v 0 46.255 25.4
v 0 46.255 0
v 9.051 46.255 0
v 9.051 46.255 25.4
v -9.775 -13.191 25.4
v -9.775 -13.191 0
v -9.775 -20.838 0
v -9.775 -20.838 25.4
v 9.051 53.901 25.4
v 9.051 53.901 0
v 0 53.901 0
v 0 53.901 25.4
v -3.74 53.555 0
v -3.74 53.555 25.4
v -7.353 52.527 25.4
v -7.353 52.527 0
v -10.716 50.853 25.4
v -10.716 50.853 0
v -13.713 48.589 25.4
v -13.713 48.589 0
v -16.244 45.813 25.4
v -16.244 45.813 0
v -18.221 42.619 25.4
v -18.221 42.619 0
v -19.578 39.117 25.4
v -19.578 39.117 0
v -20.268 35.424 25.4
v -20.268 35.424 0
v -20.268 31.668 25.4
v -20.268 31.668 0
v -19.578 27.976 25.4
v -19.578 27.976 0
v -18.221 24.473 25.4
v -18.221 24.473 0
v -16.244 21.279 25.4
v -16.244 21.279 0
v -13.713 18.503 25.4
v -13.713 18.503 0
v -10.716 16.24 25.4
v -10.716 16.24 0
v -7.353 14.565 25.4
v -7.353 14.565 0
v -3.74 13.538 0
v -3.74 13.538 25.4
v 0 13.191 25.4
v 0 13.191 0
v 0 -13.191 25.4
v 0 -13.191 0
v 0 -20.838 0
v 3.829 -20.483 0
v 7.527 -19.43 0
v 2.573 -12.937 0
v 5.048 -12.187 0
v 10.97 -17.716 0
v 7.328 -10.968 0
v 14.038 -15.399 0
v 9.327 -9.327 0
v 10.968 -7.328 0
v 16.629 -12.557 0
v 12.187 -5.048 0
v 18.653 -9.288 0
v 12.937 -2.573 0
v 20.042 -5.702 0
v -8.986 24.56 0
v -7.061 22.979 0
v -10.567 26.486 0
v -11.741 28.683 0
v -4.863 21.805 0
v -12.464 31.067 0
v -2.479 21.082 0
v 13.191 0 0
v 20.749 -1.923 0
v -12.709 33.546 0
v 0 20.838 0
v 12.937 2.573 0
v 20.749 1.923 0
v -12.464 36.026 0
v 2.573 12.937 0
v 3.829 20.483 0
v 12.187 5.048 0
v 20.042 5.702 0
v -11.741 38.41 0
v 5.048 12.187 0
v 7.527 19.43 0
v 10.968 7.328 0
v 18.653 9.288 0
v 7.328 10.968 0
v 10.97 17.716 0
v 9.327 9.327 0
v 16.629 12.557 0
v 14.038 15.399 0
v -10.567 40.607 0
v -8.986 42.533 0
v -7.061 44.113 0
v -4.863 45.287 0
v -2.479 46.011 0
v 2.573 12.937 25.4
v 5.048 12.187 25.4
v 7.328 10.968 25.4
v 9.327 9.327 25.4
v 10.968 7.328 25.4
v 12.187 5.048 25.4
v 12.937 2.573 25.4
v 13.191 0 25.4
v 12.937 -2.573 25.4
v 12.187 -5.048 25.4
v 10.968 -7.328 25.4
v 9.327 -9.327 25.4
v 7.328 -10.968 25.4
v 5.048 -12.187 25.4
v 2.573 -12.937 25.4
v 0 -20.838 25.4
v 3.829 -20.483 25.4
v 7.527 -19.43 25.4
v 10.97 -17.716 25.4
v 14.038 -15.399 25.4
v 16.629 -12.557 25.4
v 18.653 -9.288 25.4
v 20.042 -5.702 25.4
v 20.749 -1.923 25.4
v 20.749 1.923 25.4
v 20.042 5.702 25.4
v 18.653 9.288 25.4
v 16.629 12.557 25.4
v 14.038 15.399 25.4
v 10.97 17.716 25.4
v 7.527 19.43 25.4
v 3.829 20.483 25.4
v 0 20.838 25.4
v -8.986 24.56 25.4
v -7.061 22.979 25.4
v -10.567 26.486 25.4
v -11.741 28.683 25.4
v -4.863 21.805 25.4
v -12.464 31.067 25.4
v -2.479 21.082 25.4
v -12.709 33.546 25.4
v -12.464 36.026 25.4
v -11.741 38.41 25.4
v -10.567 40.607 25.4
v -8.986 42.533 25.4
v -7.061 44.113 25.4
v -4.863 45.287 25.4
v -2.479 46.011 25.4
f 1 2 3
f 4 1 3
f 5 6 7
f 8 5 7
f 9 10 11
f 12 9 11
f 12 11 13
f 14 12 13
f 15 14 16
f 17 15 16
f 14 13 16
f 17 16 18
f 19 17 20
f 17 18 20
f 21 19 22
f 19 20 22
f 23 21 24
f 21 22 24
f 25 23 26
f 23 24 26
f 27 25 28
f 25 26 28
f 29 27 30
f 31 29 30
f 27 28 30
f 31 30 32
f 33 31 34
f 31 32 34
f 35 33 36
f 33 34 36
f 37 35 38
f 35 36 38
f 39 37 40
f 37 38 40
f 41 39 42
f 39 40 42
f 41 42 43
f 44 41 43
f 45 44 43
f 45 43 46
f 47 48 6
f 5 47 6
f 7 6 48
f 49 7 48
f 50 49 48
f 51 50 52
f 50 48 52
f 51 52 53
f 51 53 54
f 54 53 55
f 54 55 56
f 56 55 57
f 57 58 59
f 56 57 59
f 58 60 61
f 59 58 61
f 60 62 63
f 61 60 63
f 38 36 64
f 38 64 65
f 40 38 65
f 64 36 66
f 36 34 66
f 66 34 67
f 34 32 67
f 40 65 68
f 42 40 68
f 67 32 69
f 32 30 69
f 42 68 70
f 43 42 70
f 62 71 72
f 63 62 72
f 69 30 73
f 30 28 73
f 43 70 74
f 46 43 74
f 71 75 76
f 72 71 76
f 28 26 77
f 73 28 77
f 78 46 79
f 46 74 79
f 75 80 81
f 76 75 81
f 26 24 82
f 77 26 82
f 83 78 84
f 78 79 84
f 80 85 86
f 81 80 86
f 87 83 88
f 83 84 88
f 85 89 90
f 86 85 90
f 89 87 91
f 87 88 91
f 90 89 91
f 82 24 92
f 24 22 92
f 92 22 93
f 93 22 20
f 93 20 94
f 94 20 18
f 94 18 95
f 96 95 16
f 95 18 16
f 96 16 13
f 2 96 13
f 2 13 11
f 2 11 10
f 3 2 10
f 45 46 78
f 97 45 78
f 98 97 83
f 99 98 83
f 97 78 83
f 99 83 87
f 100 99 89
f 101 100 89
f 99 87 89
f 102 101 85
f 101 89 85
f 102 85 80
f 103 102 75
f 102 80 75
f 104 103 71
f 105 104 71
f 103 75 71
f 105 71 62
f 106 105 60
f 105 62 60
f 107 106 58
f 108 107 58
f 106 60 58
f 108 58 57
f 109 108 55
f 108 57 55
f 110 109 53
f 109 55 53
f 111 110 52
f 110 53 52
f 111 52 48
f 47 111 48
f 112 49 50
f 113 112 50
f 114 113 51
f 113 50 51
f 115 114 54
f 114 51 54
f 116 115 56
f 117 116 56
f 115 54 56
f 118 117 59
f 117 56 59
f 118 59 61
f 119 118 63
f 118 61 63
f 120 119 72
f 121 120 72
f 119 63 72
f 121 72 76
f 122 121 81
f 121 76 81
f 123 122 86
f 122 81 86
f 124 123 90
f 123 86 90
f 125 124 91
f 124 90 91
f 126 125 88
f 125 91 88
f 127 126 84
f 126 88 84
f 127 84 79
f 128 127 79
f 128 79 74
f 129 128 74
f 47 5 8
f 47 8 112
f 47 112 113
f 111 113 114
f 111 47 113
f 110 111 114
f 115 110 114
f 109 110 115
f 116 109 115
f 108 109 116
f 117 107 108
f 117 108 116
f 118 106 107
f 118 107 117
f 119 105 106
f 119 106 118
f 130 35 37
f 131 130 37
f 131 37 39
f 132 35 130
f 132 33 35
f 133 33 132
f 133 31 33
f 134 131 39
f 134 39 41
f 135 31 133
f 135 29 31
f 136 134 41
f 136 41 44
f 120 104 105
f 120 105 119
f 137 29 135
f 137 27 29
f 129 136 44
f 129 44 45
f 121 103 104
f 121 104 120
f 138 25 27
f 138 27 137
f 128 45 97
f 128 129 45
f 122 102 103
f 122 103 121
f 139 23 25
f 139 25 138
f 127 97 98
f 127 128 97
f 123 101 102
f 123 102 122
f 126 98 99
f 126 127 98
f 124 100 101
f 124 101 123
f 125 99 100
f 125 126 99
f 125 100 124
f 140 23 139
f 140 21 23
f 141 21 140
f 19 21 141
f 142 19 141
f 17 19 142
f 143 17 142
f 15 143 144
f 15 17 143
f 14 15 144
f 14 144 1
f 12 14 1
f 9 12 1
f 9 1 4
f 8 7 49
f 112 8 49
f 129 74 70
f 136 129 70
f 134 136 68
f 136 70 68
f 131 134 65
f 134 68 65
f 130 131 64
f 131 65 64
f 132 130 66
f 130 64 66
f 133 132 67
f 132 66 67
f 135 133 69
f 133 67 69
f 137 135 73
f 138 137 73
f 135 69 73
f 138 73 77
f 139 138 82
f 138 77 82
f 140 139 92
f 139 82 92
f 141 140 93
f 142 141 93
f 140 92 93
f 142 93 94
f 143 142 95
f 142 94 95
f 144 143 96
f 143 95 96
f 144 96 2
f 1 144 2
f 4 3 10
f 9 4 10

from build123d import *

# Parameters (mm, degrees)
F1_DEPTH = 25.4


with BuildPart() as f1:
    # F0 (on Top) → F1 (new body)
    with BuildSketch(Plane.XY):
        with BuildLine():
            ThreePointArc((0, 13.190946), (13.190946, 0), (0, -13.190946))
            Line((0, -13.190946), (-9.774976, -13.190946))
            Line((-9.774976, -13.190946), (-9.774976, -20.837533))
            Line((-9.774976, -20.837533), (0, -20.837533))
            ThreePointArc((0, -20.837533), (20.837533, 0), (0, 20.837533))
            ThreePointArc((0, 20.837533), (-12.708639, 33.546172), (0, 46.254811))
            Line((0, 46.254811), (9.050903, 46.254811))
            Line((9.050903, 46.254811), (9.050903, 53.901398))
            Line((9.050903, 53.901398), (0, 53.901398))
            ThreePointArc((0, 53.901398), (-20.355226, 33.546172), (0, 13.190946))
        make_face()
    extrude(amount=F1_DEPTH)


solid = f1.part
